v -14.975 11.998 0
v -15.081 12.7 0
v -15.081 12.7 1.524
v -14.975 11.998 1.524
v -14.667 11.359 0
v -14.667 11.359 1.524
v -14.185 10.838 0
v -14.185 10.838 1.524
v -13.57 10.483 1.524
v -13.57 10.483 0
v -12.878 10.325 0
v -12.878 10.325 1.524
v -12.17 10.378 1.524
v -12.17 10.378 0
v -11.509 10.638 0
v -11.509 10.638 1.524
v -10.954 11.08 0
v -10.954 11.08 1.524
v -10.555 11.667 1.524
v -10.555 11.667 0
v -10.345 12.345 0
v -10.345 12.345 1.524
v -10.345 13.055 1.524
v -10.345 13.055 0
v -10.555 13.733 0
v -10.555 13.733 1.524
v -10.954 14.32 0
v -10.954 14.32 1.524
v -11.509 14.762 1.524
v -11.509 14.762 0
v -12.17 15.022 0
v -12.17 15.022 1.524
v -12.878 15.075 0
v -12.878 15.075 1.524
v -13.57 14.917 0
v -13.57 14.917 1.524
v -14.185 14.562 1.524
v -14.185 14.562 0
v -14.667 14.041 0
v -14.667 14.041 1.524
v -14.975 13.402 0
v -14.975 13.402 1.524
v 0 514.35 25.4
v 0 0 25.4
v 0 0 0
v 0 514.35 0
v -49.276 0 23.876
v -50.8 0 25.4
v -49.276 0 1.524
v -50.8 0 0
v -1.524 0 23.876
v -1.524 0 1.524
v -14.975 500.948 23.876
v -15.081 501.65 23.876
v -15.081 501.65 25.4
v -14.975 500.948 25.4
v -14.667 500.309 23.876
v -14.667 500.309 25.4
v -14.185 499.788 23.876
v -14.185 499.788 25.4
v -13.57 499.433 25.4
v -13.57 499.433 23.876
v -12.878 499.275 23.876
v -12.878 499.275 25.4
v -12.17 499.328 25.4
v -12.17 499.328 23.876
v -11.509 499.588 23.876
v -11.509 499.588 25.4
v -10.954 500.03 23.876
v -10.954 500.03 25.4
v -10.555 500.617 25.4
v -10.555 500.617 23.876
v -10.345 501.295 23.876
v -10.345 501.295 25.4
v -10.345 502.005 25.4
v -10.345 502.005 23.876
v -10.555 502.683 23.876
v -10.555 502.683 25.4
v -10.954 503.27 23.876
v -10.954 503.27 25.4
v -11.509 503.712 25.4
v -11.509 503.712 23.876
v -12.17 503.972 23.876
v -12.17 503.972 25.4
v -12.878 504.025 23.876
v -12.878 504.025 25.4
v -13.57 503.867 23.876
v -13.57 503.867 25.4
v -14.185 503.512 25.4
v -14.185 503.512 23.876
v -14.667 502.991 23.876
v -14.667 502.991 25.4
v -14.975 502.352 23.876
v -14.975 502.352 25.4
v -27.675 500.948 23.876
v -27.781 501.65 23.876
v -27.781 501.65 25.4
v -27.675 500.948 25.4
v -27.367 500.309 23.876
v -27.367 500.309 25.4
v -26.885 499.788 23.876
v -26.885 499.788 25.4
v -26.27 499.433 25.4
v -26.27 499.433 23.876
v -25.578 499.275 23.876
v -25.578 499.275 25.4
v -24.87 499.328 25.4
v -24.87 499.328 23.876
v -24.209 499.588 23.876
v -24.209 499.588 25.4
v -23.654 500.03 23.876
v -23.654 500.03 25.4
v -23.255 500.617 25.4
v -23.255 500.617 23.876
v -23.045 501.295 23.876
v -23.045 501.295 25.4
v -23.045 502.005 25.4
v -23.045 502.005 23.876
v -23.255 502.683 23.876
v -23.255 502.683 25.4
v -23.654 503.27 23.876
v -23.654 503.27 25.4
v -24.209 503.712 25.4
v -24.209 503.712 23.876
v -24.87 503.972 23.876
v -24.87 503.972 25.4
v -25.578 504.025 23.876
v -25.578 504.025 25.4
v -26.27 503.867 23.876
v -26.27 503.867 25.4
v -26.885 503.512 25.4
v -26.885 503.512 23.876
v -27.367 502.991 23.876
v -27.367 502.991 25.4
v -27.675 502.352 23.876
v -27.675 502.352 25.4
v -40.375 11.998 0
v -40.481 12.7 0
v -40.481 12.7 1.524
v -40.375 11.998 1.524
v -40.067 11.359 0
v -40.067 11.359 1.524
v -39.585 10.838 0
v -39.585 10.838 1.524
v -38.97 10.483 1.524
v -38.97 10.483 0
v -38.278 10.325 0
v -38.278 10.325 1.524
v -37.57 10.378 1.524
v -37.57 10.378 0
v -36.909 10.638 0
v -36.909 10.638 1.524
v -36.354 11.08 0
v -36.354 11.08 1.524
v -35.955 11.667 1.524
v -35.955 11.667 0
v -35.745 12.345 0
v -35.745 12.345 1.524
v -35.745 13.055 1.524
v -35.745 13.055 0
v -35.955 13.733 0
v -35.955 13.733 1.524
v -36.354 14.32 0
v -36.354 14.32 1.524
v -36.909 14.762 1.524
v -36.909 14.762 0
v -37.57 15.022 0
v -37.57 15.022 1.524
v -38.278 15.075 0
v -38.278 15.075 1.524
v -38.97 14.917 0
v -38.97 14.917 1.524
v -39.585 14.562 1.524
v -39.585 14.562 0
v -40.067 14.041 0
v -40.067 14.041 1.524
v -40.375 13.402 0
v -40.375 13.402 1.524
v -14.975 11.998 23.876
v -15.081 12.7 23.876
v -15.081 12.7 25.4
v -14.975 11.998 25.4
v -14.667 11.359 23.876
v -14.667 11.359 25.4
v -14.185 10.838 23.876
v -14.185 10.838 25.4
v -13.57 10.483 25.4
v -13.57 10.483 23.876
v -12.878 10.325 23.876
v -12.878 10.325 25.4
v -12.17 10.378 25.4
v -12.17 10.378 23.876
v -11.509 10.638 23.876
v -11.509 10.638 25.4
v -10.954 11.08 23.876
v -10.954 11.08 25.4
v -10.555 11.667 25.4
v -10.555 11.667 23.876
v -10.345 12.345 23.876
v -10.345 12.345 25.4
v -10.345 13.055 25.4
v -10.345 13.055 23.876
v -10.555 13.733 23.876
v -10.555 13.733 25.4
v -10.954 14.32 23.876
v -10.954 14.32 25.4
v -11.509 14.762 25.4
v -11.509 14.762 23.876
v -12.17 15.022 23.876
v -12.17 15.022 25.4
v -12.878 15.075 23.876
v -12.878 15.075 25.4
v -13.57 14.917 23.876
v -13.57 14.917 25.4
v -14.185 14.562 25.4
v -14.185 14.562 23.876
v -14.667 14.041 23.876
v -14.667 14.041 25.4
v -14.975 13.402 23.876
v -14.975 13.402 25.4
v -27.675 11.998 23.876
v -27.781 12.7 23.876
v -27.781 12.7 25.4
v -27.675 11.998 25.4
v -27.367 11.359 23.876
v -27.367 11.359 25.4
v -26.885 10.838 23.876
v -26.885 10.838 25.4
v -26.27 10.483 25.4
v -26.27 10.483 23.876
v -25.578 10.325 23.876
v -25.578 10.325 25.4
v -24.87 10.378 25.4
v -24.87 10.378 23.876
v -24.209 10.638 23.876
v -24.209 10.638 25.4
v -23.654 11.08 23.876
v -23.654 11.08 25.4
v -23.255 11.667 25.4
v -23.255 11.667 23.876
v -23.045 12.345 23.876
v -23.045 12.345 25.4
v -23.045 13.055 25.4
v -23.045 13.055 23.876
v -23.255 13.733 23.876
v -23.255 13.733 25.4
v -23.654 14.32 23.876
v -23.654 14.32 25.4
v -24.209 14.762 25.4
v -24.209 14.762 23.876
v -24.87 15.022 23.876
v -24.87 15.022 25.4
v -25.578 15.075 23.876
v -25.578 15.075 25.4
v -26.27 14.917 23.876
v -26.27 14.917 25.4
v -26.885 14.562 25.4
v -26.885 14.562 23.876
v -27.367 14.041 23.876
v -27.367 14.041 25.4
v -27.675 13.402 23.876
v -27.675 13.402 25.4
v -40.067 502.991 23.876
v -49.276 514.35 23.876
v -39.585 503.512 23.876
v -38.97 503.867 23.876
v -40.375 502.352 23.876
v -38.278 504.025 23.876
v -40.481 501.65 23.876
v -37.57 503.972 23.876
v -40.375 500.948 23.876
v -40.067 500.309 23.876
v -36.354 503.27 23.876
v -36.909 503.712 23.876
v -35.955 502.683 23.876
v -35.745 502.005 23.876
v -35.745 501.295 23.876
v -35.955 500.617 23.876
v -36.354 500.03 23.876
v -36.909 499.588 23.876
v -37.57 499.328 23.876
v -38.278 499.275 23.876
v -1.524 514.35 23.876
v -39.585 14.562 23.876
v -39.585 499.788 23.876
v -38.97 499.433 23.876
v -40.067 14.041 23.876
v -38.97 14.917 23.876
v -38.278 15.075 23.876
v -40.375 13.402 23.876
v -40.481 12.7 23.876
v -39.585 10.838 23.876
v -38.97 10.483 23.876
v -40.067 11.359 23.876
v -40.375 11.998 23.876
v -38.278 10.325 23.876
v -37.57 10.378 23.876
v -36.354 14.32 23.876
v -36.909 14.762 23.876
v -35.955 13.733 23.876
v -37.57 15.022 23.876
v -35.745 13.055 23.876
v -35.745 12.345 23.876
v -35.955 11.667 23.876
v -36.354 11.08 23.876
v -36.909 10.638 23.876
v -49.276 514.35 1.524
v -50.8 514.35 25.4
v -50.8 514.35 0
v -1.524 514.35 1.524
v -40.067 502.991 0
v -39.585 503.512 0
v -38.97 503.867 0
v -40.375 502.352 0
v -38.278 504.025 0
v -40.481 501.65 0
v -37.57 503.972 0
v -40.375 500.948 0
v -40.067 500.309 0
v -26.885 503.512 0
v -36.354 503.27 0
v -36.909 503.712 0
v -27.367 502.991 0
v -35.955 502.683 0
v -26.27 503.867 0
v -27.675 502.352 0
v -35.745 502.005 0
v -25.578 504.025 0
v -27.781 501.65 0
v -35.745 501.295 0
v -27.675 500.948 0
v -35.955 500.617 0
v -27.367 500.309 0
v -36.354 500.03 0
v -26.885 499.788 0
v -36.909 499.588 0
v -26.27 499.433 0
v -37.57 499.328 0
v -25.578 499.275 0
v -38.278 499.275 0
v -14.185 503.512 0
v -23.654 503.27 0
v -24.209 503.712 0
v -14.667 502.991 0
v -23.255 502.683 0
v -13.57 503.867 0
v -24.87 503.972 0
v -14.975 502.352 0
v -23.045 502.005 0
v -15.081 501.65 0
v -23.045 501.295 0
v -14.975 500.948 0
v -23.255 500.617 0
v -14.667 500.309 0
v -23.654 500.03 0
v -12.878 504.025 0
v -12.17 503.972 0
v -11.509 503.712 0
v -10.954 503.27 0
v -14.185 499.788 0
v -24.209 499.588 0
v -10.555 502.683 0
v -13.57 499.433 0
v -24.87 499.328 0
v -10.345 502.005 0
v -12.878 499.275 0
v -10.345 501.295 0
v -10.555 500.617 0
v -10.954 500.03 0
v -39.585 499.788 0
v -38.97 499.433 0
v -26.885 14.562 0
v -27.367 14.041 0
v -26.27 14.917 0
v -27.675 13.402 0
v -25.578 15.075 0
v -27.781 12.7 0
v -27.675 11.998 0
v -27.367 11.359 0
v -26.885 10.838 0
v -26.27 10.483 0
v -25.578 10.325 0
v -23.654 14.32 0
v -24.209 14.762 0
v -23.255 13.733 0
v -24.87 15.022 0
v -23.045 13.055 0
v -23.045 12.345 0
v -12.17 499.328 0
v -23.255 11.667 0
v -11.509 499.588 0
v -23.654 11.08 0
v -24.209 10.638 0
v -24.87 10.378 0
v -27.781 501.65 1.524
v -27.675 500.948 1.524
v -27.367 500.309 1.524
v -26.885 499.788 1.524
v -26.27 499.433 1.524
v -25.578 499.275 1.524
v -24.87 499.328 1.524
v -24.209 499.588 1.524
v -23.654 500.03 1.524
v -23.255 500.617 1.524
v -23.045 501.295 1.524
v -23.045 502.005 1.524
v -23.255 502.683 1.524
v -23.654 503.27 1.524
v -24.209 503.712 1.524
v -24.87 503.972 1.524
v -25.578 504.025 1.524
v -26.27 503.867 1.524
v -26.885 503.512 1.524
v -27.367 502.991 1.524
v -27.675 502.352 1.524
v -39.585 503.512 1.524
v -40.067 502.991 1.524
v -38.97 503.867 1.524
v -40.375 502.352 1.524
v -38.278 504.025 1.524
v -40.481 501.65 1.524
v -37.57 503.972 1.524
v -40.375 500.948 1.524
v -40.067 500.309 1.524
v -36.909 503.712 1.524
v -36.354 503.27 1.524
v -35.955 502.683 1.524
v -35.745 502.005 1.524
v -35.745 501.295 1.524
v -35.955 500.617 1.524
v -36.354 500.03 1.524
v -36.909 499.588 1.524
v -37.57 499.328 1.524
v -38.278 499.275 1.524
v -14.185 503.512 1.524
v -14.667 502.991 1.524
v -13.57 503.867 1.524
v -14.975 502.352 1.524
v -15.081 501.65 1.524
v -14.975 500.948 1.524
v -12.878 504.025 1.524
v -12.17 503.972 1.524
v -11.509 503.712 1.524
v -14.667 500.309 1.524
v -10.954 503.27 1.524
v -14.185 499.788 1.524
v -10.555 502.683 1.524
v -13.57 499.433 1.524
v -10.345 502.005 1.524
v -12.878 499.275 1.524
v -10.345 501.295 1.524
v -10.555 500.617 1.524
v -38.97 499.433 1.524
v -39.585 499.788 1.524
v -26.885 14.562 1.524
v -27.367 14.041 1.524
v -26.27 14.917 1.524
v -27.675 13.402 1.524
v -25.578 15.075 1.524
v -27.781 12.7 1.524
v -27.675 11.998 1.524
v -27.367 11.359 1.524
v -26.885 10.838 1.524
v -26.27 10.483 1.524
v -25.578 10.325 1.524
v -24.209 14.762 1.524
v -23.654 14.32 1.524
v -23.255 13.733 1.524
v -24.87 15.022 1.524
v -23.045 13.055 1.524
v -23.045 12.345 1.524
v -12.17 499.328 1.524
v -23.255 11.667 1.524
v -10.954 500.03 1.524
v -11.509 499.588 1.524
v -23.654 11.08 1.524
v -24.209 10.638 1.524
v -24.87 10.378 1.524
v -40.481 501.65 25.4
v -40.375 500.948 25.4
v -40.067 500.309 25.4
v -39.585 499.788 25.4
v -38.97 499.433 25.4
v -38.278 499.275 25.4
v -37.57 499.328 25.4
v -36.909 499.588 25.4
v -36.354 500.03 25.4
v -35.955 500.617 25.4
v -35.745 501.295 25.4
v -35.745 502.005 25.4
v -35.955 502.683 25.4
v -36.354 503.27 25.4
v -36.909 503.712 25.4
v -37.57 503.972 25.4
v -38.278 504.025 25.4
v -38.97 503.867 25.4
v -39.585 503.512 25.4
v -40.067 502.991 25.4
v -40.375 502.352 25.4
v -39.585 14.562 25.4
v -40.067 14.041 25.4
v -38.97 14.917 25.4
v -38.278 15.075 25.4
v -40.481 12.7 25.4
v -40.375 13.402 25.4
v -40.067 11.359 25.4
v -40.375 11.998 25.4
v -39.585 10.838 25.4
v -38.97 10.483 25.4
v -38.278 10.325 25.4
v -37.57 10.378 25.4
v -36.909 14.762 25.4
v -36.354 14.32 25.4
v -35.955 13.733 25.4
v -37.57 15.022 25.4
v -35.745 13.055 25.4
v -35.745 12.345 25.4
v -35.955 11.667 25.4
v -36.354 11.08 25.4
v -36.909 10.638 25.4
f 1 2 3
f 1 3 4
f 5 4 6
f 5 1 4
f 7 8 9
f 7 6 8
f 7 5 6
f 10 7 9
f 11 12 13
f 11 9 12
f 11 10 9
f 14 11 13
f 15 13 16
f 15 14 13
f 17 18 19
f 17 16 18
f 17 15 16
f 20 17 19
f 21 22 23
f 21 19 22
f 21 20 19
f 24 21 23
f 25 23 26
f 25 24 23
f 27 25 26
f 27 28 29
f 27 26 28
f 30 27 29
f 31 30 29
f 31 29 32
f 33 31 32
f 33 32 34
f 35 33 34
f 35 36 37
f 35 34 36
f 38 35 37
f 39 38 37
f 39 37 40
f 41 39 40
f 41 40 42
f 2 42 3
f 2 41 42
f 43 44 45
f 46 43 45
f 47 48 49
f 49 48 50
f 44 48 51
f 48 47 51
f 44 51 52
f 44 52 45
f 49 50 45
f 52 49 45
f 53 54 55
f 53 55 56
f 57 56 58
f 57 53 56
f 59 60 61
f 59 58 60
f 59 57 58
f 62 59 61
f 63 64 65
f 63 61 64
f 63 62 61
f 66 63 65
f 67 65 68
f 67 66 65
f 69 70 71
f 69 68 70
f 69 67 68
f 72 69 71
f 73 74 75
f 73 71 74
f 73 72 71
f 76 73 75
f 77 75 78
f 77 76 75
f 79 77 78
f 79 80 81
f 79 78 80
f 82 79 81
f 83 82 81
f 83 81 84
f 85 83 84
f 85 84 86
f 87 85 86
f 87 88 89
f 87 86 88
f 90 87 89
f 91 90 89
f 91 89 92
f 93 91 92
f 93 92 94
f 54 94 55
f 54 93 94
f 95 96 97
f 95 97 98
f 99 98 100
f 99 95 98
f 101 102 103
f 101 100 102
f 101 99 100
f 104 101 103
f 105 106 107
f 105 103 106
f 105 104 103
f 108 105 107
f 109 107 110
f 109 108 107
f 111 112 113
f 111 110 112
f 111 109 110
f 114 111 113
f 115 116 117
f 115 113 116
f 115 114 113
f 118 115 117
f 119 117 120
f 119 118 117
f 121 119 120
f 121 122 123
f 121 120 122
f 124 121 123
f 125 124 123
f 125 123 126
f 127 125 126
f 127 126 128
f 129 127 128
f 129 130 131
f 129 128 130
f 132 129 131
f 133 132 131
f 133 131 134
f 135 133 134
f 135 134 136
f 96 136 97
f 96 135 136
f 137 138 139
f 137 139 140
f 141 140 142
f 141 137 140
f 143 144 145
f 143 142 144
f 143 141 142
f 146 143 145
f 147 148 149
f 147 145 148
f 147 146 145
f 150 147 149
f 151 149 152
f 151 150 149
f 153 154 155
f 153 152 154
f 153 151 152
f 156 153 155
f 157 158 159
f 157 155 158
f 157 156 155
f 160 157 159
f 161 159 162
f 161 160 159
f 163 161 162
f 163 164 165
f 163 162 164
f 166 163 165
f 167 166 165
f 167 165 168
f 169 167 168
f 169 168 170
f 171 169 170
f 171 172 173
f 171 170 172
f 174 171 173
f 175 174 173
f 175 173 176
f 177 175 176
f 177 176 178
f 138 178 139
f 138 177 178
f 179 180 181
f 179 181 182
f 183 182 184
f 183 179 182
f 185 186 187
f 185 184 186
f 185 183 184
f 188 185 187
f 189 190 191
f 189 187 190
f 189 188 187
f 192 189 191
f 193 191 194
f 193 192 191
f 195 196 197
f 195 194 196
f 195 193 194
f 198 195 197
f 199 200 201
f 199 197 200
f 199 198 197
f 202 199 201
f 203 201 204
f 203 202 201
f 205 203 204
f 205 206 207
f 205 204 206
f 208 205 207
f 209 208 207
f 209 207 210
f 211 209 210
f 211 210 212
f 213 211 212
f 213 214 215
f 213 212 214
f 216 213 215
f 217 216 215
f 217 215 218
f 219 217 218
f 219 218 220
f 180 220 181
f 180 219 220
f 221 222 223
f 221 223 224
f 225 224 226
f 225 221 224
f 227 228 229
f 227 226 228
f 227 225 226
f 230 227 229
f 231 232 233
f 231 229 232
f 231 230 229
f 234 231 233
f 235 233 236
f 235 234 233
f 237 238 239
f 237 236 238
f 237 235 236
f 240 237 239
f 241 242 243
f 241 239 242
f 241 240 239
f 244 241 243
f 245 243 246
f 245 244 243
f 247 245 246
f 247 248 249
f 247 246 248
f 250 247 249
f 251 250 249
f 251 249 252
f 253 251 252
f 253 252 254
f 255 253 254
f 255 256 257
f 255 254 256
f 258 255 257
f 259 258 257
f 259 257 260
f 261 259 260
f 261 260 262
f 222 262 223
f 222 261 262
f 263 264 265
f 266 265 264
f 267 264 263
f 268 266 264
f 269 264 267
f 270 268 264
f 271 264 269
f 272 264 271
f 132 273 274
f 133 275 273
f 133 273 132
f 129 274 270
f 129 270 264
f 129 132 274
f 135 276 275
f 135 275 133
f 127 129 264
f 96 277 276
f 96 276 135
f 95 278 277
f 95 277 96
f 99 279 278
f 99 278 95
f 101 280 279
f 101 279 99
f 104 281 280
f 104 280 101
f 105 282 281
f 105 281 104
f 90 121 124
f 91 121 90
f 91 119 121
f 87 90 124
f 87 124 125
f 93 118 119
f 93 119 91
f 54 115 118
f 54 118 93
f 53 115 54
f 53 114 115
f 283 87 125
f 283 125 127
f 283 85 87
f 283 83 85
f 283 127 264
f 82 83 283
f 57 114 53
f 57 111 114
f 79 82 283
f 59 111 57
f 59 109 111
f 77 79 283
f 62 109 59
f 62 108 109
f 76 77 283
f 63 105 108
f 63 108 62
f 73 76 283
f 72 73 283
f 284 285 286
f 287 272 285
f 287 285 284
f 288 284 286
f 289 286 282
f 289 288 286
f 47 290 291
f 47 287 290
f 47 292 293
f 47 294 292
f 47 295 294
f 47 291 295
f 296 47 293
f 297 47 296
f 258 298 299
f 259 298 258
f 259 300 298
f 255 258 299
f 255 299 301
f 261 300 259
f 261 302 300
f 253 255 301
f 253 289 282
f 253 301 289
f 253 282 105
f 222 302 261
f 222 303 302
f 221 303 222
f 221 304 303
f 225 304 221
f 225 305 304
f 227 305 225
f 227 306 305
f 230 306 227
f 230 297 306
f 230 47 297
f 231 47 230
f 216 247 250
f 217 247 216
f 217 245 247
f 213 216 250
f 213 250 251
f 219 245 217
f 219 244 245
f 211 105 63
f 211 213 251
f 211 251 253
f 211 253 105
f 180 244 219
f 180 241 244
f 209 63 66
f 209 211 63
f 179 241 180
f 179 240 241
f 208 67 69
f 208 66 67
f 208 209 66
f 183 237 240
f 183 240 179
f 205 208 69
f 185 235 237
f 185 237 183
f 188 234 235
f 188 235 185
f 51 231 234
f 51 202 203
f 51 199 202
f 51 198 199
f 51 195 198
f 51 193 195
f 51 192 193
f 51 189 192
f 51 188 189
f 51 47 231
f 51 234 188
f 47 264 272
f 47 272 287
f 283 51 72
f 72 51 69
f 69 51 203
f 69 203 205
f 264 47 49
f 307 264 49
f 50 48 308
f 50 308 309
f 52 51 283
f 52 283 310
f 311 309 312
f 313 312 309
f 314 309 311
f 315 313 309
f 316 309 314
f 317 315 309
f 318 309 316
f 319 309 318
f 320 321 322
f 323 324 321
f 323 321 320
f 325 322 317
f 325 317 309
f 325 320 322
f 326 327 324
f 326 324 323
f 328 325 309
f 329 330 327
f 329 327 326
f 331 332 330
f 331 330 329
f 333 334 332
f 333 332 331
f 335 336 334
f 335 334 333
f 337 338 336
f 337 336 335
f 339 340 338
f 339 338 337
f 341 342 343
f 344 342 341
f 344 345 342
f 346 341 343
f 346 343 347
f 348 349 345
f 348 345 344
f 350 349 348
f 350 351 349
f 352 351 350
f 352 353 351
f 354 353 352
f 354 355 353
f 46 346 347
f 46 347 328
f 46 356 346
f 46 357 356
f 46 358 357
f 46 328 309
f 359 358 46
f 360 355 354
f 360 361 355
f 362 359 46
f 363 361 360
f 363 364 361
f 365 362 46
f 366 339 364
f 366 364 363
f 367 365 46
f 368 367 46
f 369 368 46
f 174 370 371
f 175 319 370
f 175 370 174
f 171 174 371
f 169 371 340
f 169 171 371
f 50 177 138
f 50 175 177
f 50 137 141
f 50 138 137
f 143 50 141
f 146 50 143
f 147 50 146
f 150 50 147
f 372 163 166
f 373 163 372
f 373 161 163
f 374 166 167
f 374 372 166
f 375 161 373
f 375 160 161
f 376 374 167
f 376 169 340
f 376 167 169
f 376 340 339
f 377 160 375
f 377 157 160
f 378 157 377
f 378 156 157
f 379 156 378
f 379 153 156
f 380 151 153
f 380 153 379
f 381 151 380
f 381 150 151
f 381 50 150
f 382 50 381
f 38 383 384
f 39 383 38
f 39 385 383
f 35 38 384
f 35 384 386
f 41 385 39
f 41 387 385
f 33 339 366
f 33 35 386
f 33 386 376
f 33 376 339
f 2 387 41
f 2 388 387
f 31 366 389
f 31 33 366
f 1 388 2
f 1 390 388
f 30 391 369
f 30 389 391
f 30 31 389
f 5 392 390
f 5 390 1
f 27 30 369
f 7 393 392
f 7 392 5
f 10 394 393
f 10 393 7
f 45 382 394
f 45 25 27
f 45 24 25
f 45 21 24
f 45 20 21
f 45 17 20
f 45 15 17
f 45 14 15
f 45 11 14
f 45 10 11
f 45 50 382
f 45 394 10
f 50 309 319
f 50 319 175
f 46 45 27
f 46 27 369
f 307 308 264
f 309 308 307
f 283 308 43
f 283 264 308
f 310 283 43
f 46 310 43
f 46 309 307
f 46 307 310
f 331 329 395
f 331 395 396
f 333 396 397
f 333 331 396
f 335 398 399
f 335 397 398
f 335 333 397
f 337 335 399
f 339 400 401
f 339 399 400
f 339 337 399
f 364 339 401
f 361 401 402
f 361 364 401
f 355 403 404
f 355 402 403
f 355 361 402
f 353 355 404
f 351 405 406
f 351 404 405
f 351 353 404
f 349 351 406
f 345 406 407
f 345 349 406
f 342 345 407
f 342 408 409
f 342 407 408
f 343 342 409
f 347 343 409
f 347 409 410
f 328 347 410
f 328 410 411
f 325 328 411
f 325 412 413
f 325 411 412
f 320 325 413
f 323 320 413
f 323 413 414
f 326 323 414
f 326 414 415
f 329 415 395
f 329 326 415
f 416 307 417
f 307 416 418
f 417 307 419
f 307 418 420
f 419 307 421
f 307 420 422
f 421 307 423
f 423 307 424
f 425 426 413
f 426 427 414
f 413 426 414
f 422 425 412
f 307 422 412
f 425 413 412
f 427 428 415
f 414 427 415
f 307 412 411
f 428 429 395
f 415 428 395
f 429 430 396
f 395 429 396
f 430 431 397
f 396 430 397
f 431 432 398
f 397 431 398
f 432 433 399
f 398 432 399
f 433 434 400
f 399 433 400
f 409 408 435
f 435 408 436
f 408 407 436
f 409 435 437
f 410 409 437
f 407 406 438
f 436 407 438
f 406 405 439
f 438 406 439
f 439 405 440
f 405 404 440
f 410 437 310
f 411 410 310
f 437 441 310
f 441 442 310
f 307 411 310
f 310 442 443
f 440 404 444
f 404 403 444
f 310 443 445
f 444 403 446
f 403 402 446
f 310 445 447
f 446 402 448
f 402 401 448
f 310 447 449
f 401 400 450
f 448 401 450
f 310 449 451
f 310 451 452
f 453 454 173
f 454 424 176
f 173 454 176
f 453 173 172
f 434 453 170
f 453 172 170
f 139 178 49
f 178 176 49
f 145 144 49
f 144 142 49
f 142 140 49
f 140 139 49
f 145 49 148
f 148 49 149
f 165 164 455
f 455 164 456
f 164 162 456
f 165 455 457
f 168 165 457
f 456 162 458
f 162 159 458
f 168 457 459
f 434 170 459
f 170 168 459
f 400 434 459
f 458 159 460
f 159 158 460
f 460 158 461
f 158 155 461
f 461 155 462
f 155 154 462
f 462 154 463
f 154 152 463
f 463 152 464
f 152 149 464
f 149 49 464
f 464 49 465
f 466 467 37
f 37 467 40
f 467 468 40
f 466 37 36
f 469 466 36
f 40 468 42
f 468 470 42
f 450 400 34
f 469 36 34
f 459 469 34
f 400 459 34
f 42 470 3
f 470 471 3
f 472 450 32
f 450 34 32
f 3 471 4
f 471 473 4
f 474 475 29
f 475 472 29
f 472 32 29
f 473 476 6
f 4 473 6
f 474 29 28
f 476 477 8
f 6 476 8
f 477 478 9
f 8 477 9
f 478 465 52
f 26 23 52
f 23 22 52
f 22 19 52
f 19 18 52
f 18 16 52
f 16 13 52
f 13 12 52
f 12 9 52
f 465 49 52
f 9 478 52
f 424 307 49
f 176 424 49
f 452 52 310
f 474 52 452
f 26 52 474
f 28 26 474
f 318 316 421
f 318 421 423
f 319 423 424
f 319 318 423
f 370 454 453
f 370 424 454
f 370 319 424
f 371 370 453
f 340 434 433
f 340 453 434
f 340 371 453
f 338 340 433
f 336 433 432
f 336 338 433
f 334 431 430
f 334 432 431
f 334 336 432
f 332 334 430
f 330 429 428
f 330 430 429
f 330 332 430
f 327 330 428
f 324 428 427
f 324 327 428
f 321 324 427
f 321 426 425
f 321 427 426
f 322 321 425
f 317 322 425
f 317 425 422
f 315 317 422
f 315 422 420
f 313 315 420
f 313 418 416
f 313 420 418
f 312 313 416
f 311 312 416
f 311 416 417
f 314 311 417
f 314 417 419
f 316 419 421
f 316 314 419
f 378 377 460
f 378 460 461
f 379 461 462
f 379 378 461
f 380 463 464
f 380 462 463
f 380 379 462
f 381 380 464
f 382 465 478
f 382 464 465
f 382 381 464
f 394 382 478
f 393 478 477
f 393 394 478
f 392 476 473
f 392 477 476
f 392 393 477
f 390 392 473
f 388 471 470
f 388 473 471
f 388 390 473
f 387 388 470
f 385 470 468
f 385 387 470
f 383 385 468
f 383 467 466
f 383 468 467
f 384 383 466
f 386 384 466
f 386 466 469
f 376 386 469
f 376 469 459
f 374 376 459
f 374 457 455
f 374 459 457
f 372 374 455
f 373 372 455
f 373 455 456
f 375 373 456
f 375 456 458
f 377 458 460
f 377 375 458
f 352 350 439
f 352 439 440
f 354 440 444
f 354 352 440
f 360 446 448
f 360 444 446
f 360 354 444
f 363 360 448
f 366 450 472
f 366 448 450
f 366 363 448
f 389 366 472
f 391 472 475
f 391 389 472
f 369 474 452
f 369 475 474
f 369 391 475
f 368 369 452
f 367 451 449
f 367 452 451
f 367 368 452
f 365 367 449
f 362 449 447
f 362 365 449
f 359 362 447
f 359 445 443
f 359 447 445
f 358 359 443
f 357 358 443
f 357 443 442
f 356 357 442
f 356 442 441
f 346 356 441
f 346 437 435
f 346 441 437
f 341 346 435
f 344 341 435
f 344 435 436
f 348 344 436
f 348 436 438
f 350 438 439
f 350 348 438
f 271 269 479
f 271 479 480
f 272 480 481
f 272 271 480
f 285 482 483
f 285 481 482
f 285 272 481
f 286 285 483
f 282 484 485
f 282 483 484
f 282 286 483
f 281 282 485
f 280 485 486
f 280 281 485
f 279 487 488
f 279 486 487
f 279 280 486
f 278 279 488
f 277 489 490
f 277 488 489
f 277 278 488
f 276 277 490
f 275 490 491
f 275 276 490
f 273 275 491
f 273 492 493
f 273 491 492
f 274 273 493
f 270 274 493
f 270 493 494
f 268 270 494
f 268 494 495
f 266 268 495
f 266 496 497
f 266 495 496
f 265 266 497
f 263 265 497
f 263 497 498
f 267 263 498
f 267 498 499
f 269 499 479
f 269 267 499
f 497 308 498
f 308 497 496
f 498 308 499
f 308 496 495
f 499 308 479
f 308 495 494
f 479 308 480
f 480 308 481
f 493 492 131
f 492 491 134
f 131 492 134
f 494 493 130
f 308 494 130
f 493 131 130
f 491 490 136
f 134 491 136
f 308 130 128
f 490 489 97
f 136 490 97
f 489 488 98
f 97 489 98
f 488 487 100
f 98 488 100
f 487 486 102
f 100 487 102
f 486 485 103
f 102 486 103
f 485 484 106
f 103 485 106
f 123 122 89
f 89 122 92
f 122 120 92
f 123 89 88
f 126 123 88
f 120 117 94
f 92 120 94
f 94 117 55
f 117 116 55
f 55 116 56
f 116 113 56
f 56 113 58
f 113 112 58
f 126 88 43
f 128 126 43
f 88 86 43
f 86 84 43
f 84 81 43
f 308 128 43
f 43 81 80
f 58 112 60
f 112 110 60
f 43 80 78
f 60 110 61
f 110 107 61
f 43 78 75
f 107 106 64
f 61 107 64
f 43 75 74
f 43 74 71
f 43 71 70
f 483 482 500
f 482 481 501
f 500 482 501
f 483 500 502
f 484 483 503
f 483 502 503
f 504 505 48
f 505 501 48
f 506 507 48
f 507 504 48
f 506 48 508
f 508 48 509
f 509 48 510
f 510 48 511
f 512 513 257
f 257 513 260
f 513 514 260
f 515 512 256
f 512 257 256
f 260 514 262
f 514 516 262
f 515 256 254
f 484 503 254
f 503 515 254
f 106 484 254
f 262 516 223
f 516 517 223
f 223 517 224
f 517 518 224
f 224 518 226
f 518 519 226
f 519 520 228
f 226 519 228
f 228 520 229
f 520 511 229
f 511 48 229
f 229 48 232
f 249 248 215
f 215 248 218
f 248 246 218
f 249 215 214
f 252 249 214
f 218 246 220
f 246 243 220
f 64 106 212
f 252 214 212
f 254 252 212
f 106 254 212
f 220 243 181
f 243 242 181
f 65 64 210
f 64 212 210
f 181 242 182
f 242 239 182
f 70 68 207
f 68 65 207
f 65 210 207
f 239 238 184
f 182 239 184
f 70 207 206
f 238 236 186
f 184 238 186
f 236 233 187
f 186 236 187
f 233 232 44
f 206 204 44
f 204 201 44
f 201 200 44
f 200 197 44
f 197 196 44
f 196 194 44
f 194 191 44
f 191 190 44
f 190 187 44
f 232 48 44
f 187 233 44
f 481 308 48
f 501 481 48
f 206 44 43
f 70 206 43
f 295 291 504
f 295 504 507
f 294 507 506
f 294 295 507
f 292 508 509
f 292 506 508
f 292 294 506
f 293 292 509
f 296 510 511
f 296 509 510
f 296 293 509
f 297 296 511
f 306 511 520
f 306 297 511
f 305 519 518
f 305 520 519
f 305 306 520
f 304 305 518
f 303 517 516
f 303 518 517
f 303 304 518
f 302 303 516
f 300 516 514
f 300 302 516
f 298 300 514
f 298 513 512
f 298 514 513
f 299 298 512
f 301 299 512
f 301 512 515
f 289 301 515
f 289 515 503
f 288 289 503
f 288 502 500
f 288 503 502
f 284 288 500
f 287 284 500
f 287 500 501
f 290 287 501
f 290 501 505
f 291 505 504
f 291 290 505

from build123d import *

# Parameters (mm, degrees)
SKETCH1_W               = 50.8
SKETCH1_H               = 25.4
SKETCH1_W_2             = 47.752
SKETCH1_H_2             = 22.352
EXTRUDE_THIN1_DEPTH     = 514.35
CUT_EXTRUDE1_DEPTH      = 518.47630139
CUT_EXTRUDE1_DEPTH_BACK = 518.47630139
SKETCH2_R               = 2.38125


with BuildPart() as part:
    # Sketch1 → Extrude-Thin1 (new body)
    with BuildSketch(Plane(origin=(0, 0, 0), x_dir=(1, 0, 0), z_dir=(0, 1, 0))):
        with Locations((-25.4, -12.7)):
            Rectangle(SKETCH1_W, SKETCH1_H)
        with Locations((-25.4, -12.7)):
            Rectangle(SKETCH1_W_2, SKETCH1_H_2, mode=Mode.SUBTRACT)
    extrude(amount=EXTRUDE_THIN1_DEPTH)

    # Sketch2 → Cut-Extrude1 (cut, two sides: drawn at the far end of the back side and taken through both)
    with BuildSketch(Plane.XY.offset(25.4).offset(-CUT_EXTRUDE1_DEPTH_BACK)):
        with Locations(Location((-38.1, 12.7, 0), (0, 0, 180))):
            Circle(SKETCH2_R)
        with Locations(Location((-25.4, 12.7, 0), (0, 0, 180))):
            Circle(SKETCH2_R)
        with Locations(Location((-12.7, 12.7, 0), (0, 0, 180))):
            Circle(SKETCH2_R)
        with Locations(Location((-38.1, 501.65, 0), (0, 0, 180))):
            Circle(SKETCH2_R)
        with Locations(Location((-25.4, 501.65, 0), (0, 0, 180))):
            Circle(SKETCH2_R)
        with Locations(Location((-12.7, 501.65, 0), (0, 0, 180))):
            Circle(SKETCH2_R)
    extrude(amount=CUT_EXTRUDE1_DEPTH + CUT_EXTRUDE1_DEPTH_BACK, mode=Mode.SUBTRACT)


solid = part.part
